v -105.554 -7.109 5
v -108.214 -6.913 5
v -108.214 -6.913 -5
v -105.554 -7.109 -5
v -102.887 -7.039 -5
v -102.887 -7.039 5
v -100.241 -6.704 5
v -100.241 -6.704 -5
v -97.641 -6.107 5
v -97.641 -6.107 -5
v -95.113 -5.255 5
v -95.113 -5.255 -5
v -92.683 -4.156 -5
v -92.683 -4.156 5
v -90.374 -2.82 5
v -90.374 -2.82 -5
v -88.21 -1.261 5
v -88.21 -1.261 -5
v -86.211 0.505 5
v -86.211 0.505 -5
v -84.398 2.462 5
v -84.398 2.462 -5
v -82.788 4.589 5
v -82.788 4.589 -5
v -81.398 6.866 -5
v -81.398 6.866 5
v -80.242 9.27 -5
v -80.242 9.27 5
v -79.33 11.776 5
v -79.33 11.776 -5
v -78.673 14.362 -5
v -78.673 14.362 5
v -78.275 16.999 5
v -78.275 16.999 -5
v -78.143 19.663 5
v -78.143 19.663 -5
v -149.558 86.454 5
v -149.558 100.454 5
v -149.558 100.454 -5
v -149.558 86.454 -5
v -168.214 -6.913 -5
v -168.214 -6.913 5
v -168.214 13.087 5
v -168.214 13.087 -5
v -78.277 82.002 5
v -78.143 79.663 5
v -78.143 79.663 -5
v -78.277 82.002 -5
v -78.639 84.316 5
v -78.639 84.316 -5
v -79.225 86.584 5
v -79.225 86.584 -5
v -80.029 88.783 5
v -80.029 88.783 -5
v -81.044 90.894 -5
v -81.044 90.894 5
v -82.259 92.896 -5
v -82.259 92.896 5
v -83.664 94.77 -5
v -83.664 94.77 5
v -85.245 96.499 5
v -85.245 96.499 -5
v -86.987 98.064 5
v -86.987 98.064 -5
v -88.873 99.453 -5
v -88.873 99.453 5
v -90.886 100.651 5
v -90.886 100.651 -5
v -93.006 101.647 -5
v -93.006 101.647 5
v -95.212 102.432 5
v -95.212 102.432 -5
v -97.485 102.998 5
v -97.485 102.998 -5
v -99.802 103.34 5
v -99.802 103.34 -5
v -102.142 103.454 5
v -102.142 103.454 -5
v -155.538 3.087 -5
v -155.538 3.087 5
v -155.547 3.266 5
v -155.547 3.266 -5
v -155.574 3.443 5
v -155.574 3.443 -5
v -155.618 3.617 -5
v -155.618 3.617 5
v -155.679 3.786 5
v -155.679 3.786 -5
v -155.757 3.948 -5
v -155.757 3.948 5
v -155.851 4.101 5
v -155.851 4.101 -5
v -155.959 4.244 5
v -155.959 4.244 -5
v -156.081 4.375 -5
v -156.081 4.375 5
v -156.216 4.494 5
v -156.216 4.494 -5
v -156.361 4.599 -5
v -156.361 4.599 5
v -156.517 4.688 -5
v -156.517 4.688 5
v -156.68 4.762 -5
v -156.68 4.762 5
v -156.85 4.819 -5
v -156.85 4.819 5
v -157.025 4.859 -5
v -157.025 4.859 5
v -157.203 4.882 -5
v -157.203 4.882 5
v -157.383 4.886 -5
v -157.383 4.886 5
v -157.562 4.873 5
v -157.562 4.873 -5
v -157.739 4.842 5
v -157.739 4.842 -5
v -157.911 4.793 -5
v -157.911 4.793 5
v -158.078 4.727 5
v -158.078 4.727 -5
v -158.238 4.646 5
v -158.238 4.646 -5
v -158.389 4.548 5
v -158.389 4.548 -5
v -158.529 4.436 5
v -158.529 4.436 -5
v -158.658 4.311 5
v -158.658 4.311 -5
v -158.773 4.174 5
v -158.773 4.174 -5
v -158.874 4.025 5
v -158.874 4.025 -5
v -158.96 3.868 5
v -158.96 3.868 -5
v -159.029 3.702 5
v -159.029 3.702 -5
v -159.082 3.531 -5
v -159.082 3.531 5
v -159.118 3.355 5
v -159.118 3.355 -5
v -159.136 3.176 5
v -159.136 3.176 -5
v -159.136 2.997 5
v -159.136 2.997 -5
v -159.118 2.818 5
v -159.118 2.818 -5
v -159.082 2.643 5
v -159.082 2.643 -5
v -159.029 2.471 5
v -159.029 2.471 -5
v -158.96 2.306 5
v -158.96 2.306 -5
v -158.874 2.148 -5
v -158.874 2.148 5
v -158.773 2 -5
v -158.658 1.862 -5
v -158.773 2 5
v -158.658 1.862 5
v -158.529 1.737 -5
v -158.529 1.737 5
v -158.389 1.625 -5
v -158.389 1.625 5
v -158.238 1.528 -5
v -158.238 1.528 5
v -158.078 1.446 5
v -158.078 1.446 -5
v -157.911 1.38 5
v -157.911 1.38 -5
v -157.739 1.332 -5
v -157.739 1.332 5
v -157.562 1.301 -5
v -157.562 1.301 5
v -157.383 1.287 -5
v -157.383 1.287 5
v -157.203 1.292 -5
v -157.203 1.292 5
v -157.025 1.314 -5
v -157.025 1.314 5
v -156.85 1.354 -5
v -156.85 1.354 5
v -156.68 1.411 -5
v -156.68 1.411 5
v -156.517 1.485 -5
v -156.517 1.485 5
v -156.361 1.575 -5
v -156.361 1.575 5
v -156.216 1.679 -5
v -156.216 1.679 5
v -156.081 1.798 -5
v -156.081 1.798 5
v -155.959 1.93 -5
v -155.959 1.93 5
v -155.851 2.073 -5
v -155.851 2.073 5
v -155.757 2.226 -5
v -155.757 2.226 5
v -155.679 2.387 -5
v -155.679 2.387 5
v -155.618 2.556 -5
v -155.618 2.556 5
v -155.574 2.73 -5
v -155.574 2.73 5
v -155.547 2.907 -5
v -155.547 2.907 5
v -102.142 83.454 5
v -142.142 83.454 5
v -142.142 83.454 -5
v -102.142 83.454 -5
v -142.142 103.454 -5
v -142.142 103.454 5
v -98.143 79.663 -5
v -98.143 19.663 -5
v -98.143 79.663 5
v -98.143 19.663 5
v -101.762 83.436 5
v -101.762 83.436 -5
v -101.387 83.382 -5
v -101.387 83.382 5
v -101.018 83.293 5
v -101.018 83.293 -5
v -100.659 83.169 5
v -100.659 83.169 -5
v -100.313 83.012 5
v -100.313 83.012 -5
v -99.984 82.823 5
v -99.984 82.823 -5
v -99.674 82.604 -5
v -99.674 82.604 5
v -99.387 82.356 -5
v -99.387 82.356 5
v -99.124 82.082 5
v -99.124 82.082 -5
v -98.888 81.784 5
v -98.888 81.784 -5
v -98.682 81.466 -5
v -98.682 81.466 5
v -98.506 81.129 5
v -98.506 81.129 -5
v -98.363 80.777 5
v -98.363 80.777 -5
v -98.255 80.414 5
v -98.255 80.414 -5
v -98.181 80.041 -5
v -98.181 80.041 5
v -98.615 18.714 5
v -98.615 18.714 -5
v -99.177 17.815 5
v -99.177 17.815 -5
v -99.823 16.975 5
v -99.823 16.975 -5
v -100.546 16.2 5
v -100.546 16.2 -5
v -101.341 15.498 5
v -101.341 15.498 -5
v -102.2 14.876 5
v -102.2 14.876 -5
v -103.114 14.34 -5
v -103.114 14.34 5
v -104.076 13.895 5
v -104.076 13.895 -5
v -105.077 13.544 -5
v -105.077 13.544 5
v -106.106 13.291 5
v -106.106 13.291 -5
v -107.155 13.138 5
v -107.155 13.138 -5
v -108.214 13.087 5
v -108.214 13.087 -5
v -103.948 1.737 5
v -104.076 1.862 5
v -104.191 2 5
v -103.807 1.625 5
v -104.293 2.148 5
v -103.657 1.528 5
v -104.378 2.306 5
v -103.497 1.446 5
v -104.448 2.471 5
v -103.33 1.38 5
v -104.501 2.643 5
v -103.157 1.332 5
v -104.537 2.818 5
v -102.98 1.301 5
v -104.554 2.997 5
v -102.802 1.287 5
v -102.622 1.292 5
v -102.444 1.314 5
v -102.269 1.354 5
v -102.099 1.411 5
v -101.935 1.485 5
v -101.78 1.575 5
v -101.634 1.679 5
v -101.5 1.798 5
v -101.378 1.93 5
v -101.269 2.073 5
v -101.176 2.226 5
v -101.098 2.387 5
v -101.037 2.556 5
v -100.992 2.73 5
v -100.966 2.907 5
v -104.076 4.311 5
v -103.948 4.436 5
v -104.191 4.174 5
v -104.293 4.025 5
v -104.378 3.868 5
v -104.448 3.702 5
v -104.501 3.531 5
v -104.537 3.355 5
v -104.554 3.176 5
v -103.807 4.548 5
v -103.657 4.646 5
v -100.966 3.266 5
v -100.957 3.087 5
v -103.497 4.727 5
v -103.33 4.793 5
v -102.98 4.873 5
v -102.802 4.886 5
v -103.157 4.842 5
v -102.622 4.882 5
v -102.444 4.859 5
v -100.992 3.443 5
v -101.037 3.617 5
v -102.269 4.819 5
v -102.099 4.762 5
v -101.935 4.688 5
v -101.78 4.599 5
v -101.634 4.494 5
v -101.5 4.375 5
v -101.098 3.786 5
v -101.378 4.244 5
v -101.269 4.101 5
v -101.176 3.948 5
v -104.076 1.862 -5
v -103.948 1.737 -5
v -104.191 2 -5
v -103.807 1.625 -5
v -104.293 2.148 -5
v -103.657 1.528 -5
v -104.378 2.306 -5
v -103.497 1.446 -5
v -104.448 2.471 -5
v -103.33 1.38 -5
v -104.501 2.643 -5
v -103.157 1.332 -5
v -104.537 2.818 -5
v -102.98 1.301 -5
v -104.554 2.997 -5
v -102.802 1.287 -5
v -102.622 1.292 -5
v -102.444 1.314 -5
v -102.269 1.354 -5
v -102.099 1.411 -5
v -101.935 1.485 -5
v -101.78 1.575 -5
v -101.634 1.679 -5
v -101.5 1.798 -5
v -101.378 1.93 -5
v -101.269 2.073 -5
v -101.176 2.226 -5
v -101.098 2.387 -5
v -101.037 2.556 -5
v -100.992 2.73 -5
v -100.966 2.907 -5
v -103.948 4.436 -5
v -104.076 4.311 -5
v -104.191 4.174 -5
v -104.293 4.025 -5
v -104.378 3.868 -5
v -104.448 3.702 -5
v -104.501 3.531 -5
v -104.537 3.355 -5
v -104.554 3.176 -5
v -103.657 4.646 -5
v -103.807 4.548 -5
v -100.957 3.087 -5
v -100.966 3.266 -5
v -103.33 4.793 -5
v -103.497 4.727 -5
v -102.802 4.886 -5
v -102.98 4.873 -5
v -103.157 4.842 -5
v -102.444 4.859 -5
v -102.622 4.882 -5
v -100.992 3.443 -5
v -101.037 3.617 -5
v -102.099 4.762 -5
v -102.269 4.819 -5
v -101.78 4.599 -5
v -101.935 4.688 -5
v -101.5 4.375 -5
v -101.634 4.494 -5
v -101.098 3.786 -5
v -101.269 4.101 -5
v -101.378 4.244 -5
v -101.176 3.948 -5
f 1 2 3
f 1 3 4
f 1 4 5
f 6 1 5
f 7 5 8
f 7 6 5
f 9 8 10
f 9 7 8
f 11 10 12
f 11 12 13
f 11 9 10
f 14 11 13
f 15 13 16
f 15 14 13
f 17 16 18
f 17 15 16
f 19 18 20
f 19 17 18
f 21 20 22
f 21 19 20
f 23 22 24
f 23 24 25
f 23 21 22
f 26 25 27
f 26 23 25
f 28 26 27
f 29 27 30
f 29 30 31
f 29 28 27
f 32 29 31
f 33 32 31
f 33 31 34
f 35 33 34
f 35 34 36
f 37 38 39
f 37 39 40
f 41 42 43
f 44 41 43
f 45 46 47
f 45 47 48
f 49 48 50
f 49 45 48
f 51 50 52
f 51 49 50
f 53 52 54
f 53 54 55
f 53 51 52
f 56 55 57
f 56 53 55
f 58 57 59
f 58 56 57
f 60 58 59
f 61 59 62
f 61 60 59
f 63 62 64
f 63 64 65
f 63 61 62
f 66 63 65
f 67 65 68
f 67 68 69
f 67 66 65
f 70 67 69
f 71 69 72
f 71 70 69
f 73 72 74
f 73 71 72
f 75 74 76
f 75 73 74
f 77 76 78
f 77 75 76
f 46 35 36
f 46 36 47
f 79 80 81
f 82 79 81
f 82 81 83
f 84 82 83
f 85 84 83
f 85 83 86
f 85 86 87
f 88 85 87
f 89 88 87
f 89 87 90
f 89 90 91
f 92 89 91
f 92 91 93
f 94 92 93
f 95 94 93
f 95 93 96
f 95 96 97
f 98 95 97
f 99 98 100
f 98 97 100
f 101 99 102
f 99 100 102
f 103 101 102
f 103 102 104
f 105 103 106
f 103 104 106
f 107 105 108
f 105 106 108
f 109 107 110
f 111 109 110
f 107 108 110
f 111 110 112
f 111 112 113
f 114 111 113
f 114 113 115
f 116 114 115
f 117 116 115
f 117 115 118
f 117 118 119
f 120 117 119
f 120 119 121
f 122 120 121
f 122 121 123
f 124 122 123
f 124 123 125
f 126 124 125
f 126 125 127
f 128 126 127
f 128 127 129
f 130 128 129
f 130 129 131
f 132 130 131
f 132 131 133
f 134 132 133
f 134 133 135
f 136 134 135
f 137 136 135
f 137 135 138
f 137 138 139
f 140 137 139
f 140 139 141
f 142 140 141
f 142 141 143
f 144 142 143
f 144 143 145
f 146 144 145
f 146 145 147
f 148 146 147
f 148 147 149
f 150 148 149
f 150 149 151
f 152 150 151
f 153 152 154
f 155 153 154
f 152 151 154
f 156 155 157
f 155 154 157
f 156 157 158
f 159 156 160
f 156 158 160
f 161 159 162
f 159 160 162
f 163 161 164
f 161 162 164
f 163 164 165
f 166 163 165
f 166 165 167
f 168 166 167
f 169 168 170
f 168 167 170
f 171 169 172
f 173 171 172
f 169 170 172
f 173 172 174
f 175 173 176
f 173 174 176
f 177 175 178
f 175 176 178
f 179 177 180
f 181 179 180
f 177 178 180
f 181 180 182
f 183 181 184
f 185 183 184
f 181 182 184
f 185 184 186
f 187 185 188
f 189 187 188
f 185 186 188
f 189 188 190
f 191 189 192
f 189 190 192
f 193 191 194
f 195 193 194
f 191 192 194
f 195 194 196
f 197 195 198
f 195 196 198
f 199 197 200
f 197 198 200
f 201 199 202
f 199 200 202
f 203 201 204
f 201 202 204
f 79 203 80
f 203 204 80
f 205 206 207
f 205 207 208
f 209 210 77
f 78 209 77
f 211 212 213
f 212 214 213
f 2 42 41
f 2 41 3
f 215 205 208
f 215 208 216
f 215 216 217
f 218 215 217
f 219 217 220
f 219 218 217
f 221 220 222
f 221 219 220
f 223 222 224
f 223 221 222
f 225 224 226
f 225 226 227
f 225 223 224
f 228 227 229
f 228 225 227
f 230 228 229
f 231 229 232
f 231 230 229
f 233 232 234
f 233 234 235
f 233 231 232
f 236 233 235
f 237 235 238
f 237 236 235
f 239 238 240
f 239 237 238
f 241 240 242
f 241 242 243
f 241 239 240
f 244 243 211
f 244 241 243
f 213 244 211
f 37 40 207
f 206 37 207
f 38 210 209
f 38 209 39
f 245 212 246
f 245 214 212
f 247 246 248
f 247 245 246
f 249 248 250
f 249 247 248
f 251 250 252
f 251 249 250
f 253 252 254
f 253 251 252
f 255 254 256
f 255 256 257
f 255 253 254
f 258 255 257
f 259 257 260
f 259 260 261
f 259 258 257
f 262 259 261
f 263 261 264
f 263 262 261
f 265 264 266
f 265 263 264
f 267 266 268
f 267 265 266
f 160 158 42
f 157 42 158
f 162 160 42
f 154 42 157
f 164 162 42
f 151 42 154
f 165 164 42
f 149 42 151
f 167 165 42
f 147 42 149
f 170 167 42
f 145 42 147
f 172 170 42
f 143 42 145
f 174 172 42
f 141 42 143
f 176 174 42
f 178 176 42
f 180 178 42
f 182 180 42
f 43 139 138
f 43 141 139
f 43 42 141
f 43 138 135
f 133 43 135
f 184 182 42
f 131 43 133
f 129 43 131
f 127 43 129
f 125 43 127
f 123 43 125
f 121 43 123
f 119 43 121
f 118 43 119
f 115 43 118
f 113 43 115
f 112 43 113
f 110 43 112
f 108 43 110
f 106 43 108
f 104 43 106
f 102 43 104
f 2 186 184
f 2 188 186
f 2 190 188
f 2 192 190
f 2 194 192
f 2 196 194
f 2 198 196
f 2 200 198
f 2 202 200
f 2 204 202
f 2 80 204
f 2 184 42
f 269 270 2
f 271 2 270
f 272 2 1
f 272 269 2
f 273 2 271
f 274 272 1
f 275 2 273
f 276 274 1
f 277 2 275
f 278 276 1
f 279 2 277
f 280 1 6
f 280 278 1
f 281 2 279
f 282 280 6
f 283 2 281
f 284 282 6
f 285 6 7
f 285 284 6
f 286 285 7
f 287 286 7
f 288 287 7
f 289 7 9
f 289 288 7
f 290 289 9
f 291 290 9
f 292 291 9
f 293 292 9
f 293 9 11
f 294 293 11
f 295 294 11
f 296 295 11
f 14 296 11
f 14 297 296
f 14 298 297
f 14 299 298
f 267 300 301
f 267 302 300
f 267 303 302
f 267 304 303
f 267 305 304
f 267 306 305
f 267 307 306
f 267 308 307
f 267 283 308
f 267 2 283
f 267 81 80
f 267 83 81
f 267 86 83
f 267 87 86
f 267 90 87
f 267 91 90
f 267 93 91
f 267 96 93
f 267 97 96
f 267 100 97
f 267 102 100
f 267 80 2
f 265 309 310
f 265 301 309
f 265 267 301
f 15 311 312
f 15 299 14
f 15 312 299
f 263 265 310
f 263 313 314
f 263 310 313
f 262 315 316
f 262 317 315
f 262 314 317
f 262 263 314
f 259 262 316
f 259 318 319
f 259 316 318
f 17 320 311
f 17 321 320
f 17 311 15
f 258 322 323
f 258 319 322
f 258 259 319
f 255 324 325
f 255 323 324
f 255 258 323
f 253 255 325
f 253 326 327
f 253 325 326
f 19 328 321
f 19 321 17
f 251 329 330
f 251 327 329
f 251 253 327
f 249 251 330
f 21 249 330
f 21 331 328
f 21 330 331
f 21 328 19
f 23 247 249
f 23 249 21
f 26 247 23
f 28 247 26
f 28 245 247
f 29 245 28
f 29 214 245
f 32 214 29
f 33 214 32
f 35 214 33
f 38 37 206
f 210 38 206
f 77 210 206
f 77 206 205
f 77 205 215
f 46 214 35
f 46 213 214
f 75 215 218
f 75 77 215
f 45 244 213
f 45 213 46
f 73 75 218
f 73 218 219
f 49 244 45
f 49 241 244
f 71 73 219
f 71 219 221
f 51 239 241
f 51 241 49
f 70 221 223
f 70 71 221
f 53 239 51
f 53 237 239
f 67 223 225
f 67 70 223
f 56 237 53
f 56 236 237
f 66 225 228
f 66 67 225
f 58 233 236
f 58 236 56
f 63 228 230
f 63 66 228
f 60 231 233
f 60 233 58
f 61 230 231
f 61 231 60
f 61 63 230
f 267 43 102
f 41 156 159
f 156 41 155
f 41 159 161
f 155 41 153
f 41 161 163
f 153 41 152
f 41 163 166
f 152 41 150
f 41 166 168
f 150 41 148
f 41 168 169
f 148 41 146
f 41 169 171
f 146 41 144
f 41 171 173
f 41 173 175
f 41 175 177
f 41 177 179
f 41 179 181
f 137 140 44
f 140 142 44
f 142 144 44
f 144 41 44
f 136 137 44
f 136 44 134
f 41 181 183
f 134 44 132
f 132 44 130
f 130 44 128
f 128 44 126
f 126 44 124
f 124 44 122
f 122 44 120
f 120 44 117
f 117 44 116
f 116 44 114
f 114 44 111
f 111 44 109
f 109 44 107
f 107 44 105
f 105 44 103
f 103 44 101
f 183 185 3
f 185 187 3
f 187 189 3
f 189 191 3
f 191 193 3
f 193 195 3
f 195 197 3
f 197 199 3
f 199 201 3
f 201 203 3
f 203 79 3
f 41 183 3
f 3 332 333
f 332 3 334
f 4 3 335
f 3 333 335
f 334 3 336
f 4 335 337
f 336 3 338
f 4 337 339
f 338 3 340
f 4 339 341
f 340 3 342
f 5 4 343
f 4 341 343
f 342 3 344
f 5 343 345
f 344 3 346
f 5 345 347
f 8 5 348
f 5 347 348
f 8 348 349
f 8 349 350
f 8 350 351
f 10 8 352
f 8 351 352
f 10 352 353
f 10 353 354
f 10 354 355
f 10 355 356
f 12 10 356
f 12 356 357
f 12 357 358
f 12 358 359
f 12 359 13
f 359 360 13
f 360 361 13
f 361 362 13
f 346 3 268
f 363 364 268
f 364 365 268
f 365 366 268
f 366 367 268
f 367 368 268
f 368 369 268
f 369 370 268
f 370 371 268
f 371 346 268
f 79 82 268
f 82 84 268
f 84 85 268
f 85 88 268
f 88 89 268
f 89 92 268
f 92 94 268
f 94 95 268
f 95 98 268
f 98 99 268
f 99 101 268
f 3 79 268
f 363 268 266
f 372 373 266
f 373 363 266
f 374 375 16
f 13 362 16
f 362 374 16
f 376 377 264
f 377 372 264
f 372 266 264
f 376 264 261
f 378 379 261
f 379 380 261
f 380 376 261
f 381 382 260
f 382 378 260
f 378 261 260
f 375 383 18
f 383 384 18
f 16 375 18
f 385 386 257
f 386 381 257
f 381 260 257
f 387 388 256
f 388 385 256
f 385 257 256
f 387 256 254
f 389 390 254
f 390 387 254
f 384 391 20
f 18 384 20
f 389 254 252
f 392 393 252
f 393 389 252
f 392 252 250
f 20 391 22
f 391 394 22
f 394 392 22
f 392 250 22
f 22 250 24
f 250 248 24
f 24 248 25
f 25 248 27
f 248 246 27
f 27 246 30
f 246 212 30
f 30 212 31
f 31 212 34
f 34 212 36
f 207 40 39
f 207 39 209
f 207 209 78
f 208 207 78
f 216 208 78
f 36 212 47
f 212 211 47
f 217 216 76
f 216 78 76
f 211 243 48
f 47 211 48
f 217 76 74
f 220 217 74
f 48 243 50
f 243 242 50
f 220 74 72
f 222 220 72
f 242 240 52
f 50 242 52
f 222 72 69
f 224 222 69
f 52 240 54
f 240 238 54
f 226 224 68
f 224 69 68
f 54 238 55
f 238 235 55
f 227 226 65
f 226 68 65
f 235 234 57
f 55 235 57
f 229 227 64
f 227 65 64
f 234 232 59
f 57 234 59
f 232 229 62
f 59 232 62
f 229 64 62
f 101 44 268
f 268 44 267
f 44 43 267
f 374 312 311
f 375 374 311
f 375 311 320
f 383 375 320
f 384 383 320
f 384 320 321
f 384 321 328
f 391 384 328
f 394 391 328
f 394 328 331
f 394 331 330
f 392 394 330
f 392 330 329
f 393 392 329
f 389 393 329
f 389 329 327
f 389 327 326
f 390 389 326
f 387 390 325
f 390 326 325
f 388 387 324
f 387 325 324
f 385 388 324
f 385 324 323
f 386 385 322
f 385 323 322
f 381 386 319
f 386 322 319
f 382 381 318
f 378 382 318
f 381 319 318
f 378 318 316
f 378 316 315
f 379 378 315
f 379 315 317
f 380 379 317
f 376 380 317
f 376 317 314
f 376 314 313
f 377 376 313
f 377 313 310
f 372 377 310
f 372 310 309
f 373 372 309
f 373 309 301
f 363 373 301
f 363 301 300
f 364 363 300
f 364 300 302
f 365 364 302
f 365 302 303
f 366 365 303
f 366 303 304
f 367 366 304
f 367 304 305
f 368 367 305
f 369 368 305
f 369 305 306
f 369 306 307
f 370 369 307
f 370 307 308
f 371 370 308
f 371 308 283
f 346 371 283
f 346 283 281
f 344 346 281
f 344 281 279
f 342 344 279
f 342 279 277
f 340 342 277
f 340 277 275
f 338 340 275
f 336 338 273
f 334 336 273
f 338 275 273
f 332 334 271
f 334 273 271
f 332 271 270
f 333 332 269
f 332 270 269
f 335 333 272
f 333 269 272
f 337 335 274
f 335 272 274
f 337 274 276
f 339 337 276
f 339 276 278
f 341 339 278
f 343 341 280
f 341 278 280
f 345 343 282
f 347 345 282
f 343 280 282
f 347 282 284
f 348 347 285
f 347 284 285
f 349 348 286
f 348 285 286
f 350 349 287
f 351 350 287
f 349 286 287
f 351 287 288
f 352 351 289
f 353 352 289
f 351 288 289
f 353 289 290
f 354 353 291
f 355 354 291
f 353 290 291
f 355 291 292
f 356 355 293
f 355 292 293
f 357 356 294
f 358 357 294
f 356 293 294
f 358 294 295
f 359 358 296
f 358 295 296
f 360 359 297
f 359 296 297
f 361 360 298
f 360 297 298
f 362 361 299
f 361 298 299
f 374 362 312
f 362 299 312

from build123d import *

# Parameters (mm, degrees)
F0_W     = 60
F0_H     = 20
F0_W_2   = 20
F0_H_2   = 60
F0_W_3   = 40
F1_DEPTH = 5
F2_R     = 1.8
F3_DEPTH = 26
F4_R     = 1.8
F5_DEPTH = 20


with BuildPart() as f1:
    # F0 (on Top) → F1 (new body, symmetric)
    with BuildSketch(Plane.XY):
        with Locations((-138.214068, 3.086677)):
            Rectangle(F0_W, F0_H)
        with BuildLine():
            ThreePointArc((-98.142568, 19.663455), (-102.199728, 14.87648), (-108.214068, 13.086677))
            Line((-108.214068, 13.086677), (-108.214068, -6.913323))
            ThreePointArc((-108.214068, -6.913323), (-87.188123, -0.402812), (-78.142568, 19.663455))
            Line((-78.142568, 19.663455), (-98.142568, 19.663455))
        make_face()
        with Locations((-88.142568, 49.663455)):
            Rectangle(F0_W_2, F0_H_2)
        with BuildLine():
            ThreePointArc((-102.141655, 83.454146), (-99.386567, 82.355881), (-98.142568, 79.663455))
            Line((-98.142568, 79.663455), (-78.142568, 79.663455))
            ThreePointArc((-78.142568, 79.663455), (-85.245257, 96.49855), (-102.141655, 103.454146))
            Line((-102.141655, 103.454146), (-102.141655, 83.454146))
        make_face()
        with Locations((-122.141655, 93.454146)):
            Rectangle(F0_W_3, F0_H)
        Polygon((-149.557854, 86.454146), (-142.141655, 83.454146), (-142.141655, 103.454146), (-149.557854, 100.454146), align=None)
    extrude(amount=F1_DEPTH, both=True)

    # F2 (on face) → F3 (cut)
    with BuildSketch(Plane.XY.offset(5)):
        with Locations((-157.338008, 3.086677)):
            Circle(F2_R)
    extrude(amount=-F3_DEPTH, mode=Mode.SUBTRACT)

    # F4 (on face) → F5 (cut)
    with BuildSketch(Plane.XY.offset(5)):
        with Locations((-102.756642, 3.086677)):
            Circle(F4_R)
    extrude(amount=-F5_DEPTH, mode=Mode.SUBTRACT)


solid = f1.part
